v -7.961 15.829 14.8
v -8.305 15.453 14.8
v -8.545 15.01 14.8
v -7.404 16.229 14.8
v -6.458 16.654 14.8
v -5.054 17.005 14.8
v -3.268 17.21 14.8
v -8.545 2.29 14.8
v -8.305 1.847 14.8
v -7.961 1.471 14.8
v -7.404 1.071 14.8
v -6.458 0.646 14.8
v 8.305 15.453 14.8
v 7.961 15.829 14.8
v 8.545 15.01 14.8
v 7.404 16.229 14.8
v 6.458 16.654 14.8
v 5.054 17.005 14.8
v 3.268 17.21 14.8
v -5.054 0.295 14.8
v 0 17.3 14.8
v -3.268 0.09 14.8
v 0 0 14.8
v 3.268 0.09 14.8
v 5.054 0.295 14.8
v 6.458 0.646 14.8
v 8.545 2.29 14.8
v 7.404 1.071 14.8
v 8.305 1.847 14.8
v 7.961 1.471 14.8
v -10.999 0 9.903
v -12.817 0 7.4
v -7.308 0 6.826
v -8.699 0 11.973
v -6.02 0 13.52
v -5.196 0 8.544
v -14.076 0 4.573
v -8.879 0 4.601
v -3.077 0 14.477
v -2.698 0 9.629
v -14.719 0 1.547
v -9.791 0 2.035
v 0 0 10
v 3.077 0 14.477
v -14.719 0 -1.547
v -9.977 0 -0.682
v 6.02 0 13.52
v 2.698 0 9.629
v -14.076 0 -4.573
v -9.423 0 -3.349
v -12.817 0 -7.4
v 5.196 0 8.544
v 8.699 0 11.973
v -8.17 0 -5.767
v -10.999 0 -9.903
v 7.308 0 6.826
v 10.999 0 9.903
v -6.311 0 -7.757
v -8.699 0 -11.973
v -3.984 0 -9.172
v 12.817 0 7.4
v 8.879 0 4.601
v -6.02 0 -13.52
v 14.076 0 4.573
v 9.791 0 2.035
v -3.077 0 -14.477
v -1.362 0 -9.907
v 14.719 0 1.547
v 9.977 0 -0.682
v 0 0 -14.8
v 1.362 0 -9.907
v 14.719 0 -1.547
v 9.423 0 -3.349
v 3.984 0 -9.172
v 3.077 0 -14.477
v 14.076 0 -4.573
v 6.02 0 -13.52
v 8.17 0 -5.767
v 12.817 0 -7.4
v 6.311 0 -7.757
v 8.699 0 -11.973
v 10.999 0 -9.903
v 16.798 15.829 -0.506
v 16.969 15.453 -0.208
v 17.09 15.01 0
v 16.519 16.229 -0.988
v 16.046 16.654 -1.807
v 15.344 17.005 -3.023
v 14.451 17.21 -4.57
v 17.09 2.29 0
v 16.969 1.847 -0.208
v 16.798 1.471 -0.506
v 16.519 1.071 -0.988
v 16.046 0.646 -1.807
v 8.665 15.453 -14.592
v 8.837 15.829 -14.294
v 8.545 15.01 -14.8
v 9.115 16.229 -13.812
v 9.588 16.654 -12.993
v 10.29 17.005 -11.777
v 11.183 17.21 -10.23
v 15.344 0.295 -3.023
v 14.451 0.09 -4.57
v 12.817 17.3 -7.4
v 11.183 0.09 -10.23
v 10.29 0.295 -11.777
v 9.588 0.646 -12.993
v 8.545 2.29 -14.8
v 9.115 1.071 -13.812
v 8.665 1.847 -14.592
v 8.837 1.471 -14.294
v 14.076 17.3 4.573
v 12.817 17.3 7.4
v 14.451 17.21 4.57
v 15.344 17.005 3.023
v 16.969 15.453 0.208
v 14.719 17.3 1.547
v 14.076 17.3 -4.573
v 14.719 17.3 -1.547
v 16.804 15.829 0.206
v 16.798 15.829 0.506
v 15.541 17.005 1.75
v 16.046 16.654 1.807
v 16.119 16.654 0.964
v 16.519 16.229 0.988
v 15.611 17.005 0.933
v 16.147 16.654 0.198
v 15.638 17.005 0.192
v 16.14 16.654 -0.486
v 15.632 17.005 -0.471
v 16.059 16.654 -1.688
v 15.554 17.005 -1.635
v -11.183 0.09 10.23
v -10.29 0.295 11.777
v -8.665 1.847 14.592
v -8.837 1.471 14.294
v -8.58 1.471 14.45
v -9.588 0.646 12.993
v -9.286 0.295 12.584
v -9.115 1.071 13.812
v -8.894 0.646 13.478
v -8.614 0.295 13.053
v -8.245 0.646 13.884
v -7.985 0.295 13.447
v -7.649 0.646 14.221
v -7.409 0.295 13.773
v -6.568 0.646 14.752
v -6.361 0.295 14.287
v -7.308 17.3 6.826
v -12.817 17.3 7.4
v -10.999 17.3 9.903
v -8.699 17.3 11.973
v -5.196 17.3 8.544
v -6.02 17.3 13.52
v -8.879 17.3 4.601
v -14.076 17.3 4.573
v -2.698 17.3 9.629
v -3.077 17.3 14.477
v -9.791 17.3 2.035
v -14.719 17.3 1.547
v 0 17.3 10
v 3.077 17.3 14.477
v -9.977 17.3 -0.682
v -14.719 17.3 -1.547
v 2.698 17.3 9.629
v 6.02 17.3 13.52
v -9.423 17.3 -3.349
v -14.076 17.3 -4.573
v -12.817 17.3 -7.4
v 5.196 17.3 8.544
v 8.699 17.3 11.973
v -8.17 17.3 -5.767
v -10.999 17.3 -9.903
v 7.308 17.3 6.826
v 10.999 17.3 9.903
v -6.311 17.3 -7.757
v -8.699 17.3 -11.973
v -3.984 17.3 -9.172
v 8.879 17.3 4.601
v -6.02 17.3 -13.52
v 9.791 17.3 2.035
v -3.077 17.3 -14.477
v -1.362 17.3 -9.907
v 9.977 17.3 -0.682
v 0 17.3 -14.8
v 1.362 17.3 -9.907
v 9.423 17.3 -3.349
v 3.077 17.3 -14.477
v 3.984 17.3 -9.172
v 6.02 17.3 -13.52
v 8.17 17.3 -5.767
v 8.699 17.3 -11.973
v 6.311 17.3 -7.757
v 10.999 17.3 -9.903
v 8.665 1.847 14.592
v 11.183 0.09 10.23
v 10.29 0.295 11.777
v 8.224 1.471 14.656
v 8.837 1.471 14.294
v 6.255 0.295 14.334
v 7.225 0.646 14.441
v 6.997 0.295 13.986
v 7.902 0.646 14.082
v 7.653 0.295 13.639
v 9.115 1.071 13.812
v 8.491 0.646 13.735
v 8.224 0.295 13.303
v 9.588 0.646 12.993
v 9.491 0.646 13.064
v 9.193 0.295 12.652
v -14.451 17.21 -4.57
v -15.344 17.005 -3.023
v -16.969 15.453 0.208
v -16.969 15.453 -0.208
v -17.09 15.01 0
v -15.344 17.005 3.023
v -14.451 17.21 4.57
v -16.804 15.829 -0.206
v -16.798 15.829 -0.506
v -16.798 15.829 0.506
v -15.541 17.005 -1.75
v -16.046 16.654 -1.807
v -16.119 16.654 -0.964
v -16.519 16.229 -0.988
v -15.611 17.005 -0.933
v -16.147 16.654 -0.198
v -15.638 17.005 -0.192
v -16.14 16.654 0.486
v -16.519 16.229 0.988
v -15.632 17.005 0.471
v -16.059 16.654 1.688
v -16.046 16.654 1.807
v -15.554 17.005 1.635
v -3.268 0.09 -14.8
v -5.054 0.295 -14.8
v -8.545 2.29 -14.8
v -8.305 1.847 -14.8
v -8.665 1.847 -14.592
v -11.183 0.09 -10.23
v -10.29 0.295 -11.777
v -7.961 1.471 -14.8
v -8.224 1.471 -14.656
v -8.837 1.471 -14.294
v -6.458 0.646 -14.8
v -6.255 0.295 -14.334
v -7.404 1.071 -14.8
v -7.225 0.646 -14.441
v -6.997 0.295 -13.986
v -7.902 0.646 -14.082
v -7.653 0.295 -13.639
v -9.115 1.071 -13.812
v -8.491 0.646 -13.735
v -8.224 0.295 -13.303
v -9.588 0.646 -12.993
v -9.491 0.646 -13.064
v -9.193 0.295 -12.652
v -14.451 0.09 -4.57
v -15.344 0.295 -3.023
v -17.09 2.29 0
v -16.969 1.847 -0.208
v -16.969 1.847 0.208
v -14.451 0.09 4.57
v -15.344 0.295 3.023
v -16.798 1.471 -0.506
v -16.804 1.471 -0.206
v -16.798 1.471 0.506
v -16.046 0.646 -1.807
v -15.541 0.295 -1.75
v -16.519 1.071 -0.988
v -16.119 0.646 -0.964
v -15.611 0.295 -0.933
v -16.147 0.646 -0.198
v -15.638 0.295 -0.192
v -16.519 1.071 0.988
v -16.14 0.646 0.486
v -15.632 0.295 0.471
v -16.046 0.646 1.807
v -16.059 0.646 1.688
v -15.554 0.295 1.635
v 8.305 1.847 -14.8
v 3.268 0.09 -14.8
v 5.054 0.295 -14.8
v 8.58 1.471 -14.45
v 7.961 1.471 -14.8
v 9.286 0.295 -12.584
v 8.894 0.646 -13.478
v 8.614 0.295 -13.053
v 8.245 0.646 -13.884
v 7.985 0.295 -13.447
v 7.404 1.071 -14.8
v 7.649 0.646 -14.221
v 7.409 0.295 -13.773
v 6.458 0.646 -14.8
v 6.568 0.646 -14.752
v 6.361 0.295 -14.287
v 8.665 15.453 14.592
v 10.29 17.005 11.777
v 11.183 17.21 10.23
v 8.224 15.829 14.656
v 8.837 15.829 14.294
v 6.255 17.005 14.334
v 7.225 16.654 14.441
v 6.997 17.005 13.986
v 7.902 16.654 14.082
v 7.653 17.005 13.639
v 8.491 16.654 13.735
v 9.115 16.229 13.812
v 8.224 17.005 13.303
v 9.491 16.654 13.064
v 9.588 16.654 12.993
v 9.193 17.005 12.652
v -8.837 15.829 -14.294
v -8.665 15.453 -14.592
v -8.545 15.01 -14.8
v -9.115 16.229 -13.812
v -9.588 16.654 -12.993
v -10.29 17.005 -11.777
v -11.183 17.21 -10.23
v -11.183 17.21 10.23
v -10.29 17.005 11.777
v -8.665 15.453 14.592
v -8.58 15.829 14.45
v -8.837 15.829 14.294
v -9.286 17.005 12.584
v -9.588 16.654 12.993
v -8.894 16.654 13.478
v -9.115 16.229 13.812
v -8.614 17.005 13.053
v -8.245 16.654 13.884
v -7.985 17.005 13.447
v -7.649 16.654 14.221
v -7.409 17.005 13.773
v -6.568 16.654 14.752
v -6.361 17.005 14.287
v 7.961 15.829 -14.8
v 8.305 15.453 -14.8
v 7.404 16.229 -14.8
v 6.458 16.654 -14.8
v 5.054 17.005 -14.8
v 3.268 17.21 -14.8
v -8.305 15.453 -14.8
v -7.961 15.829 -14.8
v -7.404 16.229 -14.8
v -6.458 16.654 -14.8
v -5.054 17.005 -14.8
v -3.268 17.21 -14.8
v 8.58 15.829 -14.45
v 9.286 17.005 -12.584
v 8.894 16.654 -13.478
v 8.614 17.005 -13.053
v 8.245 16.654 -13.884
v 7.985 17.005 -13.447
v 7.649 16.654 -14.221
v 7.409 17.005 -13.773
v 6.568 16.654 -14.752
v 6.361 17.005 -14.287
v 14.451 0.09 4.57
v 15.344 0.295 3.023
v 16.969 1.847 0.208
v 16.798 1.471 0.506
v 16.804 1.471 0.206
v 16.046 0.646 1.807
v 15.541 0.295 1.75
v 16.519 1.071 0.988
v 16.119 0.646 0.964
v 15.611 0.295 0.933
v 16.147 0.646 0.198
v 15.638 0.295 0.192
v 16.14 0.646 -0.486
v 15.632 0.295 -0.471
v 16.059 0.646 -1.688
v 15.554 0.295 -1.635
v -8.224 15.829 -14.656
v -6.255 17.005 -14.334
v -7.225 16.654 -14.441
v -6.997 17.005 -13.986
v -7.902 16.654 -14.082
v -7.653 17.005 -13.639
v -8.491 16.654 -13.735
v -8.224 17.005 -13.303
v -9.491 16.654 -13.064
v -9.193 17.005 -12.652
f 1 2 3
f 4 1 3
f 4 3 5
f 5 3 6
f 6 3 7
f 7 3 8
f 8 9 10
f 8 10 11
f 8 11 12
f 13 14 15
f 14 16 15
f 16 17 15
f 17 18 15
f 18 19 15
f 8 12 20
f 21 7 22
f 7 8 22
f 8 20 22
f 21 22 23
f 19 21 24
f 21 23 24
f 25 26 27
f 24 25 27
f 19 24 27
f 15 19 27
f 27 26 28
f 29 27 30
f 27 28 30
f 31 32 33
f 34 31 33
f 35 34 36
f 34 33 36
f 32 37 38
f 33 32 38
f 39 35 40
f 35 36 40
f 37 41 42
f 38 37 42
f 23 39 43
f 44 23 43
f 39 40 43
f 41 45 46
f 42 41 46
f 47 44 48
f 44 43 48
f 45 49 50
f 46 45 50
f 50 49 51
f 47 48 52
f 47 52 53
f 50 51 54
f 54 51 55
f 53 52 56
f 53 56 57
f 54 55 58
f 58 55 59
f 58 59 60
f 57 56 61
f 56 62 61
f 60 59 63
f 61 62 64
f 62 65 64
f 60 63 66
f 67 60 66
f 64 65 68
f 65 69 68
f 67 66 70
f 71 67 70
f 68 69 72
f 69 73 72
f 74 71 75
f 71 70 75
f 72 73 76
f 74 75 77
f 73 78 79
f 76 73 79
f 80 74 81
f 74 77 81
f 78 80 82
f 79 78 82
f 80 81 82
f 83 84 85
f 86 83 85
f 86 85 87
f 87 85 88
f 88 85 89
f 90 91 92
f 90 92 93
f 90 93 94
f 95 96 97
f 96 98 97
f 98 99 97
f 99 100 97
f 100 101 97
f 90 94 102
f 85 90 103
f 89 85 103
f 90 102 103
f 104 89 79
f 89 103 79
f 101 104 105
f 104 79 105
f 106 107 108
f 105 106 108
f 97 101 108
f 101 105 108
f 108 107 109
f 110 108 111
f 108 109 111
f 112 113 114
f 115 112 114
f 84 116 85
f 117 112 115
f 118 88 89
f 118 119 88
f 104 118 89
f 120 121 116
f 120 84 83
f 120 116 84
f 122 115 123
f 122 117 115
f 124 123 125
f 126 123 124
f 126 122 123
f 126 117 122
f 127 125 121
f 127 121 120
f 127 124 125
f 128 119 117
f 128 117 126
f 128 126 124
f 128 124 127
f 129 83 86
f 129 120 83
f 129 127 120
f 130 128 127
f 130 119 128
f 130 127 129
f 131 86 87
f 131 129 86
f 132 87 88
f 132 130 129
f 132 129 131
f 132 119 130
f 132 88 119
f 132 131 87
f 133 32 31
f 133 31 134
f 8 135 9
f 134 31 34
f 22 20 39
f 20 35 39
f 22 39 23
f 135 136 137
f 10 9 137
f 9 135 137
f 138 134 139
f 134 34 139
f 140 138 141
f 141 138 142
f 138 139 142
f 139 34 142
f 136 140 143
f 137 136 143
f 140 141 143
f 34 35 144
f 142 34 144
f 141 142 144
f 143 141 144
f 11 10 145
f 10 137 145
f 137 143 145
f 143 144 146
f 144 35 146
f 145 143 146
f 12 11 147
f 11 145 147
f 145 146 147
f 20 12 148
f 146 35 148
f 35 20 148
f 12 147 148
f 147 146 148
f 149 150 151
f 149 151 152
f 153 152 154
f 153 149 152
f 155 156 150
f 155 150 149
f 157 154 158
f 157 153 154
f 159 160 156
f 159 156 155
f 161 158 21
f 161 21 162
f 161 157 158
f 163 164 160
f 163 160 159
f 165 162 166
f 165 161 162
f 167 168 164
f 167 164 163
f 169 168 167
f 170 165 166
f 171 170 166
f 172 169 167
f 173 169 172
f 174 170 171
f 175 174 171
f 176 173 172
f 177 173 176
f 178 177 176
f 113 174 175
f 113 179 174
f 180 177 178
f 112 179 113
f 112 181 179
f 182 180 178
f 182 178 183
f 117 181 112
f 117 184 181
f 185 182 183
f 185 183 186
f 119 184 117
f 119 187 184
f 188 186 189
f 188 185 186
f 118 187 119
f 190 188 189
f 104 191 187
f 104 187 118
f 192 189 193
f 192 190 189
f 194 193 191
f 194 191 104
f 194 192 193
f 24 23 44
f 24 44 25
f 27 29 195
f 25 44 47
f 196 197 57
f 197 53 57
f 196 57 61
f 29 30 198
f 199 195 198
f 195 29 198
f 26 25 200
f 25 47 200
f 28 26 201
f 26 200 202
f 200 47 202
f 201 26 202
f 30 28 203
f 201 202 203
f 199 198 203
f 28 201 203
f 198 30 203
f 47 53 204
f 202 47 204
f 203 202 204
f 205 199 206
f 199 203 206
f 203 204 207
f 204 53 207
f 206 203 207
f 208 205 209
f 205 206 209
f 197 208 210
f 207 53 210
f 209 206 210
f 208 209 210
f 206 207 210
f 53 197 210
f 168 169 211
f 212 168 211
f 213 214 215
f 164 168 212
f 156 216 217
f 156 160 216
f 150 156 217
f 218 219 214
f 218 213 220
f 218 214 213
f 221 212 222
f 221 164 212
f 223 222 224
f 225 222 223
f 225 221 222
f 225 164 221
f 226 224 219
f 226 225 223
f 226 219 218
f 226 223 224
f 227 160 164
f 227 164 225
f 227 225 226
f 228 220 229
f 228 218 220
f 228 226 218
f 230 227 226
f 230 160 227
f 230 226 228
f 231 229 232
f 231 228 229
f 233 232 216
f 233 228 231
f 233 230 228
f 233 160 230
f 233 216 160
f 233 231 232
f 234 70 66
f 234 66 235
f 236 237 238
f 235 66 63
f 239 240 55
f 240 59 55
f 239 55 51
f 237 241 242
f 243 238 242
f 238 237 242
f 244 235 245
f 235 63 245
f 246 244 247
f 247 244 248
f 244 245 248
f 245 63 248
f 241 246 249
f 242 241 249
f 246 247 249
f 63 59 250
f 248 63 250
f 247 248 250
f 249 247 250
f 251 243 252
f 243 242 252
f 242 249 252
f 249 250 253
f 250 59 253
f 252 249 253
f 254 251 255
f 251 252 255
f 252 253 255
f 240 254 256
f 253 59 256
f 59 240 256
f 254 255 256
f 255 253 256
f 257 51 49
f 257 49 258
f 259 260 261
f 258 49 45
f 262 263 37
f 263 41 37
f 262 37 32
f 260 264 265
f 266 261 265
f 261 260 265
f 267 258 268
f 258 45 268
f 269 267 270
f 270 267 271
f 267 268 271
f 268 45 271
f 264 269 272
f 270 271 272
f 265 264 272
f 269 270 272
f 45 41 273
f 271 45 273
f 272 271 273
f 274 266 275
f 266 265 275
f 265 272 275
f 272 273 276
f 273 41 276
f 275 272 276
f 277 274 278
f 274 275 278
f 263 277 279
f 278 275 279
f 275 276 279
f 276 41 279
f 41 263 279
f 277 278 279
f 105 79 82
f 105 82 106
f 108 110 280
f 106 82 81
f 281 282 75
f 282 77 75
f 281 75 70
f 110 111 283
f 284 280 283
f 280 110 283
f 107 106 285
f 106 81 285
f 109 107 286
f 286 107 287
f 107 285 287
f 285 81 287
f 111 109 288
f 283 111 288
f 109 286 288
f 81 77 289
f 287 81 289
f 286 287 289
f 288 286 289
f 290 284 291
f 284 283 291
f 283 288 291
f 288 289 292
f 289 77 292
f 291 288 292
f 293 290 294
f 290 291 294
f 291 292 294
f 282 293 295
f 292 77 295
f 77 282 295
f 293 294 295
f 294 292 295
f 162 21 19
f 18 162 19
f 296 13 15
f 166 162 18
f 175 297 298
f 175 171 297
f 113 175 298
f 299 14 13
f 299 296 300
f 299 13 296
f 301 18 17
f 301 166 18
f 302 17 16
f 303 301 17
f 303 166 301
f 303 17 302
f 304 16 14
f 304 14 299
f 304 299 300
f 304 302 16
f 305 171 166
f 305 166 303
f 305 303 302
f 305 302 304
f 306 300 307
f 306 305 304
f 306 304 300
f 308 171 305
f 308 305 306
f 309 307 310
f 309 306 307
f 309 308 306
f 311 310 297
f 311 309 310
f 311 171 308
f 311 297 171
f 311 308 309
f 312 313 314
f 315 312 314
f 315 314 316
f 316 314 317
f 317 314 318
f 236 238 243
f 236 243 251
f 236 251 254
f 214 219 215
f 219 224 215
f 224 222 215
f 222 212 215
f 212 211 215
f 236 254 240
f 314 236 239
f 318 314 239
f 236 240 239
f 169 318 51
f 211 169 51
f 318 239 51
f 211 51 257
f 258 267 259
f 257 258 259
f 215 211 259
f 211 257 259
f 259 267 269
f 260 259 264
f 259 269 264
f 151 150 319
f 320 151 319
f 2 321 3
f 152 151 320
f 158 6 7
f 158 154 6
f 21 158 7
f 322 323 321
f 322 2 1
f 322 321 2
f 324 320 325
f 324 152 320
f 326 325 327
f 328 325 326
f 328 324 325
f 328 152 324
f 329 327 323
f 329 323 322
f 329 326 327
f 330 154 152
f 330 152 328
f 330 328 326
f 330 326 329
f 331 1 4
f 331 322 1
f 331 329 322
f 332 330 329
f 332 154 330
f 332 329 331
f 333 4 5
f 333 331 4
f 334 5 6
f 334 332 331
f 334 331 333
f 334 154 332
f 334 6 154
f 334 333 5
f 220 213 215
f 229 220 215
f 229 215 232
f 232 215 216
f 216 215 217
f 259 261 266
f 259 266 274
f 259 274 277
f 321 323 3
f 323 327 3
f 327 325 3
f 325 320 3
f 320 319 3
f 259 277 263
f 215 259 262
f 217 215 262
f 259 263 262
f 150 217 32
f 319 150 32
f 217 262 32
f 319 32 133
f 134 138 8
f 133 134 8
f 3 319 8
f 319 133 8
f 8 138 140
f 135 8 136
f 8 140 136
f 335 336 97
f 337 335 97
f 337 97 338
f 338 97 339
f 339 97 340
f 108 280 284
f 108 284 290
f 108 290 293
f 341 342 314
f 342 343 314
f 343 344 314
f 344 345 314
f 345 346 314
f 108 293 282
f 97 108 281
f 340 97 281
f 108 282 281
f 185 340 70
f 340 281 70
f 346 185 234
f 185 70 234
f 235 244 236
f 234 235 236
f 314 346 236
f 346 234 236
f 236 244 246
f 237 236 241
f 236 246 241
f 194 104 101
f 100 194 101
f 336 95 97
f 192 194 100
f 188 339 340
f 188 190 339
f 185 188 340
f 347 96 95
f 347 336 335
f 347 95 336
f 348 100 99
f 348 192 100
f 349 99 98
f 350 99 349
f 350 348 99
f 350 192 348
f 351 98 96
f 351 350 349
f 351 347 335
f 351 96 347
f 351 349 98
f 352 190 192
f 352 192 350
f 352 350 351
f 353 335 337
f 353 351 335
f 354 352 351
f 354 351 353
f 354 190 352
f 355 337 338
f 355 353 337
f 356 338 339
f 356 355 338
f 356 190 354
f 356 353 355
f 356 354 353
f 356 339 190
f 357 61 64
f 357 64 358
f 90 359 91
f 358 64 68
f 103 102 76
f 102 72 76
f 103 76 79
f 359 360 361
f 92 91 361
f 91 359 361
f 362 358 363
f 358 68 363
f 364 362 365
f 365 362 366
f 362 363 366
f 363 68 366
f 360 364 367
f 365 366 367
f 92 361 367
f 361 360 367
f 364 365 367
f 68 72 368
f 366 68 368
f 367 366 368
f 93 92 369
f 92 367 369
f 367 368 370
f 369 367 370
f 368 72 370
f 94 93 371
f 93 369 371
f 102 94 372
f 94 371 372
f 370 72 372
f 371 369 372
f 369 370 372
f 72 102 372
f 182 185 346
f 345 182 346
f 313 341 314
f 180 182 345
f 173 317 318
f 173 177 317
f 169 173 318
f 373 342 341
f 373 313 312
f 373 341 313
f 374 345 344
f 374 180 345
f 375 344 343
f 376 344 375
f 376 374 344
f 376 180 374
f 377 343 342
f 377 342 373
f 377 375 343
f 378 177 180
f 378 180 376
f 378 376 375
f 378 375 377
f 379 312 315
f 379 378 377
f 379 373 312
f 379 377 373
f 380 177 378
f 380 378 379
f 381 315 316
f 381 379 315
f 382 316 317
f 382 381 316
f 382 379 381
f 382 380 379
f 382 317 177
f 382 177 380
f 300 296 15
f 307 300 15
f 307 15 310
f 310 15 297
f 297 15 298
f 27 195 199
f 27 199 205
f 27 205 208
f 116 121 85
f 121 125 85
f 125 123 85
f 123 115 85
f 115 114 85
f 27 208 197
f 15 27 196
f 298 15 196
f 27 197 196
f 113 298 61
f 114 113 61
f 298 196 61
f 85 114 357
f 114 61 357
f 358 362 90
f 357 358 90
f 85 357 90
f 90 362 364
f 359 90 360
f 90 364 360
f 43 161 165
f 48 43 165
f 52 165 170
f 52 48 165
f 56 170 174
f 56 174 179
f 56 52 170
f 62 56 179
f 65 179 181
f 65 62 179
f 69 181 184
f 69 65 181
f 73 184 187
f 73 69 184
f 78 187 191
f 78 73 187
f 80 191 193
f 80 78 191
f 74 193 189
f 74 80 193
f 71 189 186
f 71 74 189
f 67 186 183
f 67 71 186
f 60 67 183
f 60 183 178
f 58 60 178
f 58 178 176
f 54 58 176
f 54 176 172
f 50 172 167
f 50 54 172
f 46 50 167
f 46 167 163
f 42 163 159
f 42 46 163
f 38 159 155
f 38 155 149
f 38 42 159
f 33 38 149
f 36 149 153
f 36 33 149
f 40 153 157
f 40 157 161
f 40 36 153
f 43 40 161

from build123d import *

# Parameters (mm, degrees)
SKETCH_1_R      = 10
EXTRUDE_1_DEPTH = 17.3


with BuildPart() as part:
    # 草图1 → 凸台-拉伸1 (new body)
    with BuildSketch(Plane(origin=(0, 0, 0), x_dir=(1, 0, 0), z_dir=(0, 1, 0))):
        Polygon((17.089567968, 0), (8.544783984, 14.8), (-8.544783984, 14.8), (-17.089567968, 0), (-8.544783984, -14.8), (8.544783984, -14.8), align=None)
        with Locations(Location((0, 0, 0), (0, 0, 270))):
            Circle(SKETCH_1_R, mode=Mode.SUBTRACT)
    extrude(amount=EXTRUDE_1_DEPTH)

    # 草图3 → 切除-旋转4 (revolve, cut)
    with BuildSketch(Plane(origin=(0, 0, 0), x_dir=(-0.5000000000000007, 0, -0.8660254037844383), z_dir=(0.8660254037844383, 0, -0.5000000000000007))):
        with BuildLine():
            Line((-14.8, 17.3), (-14.8, 17.928720004))
            Line((-14.8, 17.928720004), (-17.799472335, 17.928720004))
            Line((-17.799472335, 17.928720004), (-17.799472335, 15.010432032))
            Line((-17.799472335, 15.010432032), (-17.089567968, 15.010432032))
            ThreePointArc((-17.089567968, 15.010432032), (-16.301064282, 16.511496314), (-14.8, 17.3))
        make_face()
        with BuildLine():
            Line((-17.799472335, 2.289567968), (-17.089567968, 2.289567968))
            ThreePointArc((-17.089567968, 2.289567968), (-16.301064282, 0.788503686), (-14.8, 0))
            Line((-14.8, 0), (-14.8, -0.628720004))
            Line((-14.8, -0.628720004), (-17.799472335, -0.628720004))
            Line((-17.799472335, -0.628720004), (-17.799472335, 2.289567968))
        make_face()
    revolve(axis=Axis((0, 0, 0), (0, 1, 0)), mode=Mode.SUBTRACT)


solid = part.part
